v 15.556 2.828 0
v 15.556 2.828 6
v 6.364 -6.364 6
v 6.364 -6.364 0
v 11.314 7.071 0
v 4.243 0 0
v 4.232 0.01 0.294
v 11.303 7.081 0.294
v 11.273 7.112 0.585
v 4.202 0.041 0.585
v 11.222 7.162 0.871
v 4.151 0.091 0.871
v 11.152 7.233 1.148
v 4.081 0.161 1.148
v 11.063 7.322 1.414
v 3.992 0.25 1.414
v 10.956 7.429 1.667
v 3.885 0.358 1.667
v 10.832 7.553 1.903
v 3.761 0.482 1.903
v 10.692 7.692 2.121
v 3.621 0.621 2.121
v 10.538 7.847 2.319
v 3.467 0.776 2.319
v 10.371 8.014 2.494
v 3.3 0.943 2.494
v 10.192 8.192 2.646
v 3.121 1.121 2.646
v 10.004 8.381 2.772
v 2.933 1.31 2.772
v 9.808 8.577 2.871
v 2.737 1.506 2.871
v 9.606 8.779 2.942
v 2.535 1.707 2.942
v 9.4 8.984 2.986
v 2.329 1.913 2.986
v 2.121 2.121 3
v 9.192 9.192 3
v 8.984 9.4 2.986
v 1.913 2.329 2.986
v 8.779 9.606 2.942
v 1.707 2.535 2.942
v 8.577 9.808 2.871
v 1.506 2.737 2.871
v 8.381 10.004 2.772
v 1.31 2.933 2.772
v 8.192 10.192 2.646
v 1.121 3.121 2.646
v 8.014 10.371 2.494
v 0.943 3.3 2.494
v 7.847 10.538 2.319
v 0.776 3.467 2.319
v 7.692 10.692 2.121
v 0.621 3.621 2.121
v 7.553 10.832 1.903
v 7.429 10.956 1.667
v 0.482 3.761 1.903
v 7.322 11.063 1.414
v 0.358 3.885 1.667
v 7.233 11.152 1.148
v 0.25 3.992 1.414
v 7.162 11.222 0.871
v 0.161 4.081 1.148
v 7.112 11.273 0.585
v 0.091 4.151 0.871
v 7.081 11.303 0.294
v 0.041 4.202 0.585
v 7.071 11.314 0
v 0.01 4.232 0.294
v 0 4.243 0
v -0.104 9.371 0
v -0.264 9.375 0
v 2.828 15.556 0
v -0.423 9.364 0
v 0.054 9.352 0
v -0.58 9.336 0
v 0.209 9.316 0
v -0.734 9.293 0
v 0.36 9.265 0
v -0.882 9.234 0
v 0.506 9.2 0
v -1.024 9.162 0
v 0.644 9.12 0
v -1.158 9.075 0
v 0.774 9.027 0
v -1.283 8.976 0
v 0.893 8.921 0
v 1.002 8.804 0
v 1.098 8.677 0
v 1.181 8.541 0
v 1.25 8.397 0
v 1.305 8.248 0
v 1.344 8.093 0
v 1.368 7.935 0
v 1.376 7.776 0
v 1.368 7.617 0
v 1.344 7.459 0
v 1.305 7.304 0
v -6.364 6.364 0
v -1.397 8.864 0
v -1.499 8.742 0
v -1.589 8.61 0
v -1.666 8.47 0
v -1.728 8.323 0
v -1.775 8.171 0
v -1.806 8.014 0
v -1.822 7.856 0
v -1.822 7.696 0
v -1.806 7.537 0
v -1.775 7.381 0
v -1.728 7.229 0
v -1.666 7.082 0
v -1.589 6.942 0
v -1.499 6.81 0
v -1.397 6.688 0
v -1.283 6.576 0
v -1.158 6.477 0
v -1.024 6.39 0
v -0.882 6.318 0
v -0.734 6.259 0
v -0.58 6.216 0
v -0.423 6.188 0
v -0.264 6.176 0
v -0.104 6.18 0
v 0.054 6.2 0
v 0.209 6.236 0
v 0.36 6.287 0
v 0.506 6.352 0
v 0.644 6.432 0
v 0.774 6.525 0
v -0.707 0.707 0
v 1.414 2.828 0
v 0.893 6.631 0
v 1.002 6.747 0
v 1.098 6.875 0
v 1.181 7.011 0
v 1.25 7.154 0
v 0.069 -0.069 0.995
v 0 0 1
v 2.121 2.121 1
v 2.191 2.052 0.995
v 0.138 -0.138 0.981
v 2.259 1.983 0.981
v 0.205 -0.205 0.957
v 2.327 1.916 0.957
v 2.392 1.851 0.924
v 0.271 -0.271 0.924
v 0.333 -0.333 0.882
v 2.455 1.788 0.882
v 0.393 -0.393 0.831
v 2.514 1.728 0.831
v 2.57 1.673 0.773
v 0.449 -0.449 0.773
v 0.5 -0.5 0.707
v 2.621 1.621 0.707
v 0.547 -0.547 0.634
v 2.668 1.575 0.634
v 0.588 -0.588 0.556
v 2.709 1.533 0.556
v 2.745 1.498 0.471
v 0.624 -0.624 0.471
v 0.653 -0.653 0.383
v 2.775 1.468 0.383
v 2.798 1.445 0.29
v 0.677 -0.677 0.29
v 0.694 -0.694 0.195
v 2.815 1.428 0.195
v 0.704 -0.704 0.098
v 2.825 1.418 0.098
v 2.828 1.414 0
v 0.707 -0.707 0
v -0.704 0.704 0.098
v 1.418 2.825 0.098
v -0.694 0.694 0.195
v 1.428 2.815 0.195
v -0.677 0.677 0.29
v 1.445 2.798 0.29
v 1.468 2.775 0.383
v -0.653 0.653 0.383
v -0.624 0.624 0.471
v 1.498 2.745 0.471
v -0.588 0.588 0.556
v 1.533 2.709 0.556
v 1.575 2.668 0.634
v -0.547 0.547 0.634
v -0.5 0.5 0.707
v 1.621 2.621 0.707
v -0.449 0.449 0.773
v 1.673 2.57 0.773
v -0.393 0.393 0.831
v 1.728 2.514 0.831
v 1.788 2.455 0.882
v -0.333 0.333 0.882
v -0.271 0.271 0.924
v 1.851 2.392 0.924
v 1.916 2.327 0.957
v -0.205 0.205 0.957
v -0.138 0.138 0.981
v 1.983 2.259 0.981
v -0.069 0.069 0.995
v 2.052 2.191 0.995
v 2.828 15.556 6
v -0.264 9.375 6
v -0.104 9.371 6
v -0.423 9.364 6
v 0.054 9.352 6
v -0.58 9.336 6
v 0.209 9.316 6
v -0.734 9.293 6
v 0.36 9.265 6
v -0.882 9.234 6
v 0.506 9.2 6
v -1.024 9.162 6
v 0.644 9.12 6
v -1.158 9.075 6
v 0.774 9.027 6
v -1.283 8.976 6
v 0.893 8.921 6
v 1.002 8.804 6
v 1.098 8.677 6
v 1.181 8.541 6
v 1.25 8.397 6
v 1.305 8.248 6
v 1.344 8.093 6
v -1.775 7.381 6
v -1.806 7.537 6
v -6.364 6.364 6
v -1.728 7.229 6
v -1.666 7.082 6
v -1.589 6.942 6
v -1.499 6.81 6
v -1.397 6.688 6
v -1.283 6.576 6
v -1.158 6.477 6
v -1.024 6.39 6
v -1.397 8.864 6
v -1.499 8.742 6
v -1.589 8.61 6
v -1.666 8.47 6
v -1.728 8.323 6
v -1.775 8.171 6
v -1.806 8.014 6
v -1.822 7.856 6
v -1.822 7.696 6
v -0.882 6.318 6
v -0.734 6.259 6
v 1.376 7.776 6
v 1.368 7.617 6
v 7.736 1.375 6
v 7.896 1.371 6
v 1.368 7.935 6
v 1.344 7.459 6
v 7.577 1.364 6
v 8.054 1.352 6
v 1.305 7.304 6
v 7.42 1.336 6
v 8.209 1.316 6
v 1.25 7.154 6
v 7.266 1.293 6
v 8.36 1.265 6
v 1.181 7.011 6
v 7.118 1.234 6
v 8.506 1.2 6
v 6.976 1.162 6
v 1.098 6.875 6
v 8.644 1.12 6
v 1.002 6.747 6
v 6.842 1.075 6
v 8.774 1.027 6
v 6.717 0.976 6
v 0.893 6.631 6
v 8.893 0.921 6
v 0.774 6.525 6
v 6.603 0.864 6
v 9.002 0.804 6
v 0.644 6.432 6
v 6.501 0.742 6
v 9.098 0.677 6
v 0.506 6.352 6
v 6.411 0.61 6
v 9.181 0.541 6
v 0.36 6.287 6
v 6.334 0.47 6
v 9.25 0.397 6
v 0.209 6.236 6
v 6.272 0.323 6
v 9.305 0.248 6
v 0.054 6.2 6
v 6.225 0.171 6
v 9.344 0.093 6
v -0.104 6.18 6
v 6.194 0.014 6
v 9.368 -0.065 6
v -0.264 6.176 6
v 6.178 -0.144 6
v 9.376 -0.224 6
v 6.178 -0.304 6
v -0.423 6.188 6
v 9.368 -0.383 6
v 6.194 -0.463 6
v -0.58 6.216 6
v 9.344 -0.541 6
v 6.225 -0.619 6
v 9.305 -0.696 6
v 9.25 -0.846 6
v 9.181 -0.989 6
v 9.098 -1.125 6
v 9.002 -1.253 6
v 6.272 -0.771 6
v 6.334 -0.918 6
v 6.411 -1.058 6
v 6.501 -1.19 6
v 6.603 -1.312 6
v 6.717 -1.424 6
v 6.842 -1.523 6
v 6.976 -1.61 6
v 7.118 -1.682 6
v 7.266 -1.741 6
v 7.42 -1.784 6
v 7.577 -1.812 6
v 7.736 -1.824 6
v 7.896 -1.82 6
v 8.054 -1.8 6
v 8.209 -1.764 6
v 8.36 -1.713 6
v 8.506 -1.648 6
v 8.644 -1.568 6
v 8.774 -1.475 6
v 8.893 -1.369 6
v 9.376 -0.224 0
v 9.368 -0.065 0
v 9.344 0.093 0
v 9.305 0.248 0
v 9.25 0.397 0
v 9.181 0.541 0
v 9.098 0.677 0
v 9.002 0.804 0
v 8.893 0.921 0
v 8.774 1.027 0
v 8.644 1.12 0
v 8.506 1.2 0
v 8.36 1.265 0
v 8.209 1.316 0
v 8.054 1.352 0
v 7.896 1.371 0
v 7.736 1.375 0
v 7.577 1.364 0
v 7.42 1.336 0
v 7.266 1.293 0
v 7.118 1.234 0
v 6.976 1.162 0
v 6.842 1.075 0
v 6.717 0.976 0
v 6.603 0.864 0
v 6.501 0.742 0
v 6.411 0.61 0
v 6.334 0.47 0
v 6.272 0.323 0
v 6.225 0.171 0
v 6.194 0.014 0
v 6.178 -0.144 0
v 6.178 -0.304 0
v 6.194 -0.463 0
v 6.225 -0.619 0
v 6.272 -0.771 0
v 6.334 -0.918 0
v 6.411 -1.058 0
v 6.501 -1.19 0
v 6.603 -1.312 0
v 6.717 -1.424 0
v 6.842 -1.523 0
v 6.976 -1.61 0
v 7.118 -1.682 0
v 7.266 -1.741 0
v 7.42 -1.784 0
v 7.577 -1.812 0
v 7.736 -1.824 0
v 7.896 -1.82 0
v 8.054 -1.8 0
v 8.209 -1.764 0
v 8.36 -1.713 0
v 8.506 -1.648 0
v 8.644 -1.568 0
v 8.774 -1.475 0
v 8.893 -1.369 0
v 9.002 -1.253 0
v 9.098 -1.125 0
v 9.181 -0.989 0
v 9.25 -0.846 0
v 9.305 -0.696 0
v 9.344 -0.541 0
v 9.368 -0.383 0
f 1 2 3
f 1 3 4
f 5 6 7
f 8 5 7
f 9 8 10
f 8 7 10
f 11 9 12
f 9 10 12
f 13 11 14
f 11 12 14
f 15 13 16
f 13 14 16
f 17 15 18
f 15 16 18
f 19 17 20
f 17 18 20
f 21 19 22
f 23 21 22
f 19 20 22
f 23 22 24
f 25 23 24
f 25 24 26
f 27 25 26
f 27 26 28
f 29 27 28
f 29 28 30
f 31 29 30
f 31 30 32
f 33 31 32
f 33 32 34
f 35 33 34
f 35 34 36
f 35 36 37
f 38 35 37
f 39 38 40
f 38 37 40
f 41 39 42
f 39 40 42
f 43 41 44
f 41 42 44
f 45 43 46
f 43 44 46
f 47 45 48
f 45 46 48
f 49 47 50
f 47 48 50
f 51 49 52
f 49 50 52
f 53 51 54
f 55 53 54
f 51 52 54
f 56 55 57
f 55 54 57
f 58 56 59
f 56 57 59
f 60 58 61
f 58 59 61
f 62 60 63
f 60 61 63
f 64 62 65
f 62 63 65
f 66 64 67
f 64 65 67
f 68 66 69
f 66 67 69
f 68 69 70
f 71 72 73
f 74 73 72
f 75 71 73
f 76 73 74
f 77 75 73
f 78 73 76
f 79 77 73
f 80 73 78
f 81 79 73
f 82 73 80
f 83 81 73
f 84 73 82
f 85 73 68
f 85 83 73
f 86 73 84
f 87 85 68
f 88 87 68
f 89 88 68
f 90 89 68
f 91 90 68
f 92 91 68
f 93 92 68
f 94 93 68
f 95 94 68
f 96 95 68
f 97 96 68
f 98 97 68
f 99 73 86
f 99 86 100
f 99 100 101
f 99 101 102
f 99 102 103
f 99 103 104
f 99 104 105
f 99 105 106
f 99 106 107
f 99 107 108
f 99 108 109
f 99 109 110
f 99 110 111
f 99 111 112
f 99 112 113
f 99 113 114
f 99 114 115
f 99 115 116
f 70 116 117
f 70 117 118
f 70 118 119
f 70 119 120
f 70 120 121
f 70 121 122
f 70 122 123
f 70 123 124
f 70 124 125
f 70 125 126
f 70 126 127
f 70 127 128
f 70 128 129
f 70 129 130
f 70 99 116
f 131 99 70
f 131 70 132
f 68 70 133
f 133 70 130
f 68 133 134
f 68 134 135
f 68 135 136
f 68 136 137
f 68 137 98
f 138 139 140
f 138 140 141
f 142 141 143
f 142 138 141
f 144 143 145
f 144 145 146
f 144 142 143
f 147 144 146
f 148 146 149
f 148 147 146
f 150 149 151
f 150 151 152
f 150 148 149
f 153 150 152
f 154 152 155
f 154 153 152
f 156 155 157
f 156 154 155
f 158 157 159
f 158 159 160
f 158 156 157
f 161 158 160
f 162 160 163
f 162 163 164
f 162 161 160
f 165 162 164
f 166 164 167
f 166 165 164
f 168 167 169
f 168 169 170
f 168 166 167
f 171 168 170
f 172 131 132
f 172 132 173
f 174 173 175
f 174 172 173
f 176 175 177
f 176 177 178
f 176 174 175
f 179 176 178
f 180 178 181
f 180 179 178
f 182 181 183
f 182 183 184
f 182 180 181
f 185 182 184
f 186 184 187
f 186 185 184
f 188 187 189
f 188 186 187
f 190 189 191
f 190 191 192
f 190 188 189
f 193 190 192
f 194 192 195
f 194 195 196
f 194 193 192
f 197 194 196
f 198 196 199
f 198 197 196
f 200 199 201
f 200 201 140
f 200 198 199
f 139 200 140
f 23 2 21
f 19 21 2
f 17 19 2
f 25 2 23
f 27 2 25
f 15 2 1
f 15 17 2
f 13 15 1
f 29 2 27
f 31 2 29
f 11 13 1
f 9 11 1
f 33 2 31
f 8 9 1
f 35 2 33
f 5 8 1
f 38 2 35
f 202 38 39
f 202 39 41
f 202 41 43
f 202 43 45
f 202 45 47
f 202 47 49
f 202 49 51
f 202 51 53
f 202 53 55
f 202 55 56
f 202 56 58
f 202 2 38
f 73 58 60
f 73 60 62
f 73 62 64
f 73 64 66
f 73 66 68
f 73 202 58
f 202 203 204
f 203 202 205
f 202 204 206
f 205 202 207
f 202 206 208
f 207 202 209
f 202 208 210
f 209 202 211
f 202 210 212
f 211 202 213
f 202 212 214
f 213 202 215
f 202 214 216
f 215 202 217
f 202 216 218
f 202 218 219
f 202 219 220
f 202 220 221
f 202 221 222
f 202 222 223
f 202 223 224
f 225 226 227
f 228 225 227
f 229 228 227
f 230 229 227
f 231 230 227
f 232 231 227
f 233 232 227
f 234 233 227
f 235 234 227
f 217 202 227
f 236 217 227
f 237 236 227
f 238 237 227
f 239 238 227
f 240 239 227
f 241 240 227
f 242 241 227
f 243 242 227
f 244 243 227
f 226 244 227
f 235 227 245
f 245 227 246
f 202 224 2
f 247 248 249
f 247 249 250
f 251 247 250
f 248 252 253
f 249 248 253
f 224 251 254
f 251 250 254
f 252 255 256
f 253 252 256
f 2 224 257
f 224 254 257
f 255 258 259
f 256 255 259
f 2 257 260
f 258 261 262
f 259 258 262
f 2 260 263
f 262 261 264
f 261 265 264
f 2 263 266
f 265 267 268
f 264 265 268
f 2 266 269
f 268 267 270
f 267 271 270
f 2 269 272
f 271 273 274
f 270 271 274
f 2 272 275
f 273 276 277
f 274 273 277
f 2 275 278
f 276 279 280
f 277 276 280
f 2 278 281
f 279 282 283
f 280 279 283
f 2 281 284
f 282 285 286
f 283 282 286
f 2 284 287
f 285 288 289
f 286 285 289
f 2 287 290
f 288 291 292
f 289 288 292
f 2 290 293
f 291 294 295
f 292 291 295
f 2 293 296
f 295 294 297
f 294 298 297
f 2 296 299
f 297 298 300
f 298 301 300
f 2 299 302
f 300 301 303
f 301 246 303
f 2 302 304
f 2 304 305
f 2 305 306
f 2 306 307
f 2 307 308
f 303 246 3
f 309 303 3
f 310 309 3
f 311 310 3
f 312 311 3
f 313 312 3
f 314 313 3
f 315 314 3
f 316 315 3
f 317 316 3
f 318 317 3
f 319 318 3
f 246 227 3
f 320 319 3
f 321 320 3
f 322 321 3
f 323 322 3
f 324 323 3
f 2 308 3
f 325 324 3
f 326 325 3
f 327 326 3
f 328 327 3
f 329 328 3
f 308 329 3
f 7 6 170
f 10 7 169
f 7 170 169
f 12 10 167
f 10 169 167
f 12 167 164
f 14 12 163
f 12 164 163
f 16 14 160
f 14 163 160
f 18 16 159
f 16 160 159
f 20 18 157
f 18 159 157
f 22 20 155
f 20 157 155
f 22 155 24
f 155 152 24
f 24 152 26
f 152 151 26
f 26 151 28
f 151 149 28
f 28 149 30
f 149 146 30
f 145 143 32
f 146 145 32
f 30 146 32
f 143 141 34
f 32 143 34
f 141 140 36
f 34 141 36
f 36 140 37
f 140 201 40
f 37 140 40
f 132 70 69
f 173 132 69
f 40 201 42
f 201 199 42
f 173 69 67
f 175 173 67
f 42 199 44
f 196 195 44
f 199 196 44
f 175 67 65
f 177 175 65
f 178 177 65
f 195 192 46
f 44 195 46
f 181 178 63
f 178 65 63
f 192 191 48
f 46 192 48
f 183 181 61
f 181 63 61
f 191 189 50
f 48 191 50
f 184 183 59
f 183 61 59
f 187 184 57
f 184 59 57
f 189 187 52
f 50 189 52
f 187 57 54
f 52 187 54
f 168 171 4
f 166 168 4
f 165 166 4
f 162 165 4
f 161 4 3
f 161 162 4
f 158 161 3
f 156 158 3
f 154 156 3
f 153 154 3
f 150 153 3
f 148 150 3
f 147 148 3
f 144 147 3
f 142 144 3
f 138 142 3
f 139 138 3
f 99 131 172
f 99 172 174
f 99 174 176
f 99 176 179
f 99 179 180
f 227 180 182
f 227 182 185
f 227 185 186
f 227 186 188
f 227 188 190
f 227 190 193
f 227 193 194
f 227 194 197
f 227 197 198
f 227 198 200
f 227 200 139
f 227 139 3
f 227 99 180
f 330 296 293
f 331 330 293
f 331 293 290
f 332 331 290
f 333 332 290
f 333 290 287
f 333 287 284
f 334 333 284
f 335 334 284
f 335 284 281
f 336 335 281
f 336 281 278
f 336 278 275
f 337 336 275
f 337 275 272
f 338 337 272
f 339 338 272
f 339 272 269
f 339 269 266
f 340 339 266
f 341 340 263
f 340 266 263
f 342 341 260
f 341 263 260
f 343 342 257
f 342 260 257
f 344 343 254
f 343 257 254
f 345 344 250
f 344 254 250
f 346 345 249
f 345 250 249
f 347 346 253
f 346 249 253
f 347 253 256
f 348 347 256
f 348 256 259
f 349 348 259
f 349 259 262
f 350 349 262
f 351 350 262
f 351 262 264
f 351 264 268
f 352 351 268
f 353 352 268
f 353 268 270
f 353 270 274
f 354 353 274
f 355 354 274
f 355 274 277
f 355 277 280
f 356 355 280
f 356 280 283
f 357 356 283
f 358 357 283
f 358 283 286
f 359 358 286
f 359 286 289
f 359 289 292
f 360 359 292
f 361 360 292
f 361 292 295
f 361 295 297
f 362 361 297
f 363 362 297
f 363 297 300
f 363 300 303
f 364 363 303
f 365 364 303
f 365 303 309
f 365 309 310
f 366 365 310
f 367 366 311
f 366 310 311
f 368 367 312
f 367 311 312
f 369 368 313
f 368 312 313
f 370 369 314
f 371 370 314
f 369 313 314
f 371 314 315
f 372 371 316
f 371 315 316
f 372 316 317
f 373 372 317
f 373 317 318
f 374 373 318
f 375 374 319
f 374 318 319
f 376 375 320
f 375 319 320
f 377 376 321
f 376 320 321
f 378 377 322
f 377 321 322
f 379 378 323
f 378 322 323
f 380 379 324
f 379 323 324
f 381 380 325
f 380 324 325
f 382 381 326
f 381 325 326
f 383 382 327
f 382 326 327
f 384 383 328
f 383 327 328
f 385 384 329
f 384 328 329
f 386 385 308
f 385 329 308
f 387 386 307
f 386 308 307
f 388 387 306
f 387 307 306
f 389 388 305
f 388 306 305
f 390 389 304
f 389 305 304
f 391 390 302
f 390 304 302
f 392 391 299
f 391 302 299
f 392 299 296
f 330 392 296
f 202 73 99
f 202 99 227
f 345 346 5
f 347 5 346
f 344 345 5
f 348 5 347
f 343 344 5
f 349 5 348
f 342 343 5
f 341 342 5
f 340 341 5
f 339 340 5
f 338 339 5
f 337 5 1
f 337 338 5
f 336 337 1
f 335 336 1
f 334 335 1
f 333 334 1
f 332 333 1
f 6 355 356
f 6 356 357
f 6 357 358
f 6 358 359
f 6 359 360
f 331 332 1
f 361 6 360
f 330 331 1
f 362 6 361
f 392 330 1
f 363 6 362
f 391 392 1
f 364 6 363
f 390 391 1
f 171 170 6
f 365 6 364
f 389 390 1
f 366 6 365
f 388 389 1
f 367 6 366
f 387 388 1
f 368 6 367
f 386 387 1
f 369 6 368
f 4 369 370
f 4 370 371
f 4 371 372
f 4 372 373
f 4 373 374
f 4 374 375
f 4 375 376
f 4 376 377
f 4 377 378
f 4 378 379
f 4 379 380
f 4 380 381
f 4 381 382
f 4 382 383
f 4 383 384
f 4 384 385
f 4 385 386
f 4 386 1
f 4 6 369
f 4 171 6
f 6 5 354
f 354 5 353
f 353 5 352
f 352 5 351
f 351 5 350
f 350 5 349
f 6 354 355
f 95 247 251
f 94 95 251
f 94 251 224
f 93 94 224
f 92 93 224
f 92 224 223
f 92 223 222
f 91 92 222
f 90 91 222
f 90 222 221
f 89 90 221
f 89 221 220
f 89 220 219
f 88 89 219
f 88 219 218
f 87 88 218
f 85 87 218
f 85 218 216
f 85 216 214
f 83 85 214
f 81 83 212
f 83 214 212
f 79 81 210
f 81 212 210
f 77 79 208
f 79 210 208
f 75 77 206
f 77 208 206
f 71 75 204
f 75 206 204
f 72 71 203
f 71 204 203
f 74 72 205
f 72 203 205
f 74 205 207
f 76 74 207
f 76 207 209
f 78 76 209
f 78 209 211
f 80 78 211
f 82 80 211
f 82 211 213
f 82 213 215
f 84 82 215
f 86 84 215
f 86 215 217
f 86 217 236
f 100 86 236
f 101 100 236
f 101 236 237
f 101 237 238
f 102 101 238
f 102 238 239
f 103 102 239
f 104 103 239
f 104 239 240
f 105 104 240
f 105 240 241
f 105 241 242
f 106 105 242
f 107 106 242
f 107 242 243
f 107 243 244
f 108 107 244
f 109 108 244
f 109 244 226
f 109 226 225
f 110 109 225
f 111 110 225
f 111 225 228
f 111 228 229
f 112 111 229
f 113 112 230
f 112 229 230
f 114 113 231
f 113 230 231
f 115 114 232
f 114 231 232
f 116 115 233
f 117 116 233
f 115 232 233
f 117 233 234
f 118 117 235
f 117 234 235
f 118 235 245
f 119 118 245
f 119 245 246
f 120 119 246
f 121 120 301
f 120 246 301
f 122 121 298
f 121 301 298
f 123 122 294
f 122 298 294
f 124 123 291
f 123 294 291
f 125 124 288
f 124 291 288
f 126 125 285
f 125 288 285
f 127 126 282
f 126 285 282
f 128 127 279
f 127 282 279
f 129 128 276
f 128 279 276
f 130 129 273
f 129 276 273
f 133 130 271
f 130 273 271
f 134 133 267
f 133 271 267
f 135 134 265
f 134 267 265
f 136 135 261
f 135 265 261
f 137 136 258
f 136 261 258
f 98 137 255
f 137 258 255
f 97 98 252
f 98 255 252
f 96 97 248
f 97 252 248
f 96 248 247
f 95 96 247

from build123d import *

# Parameters (mm, degrees)
EXTRUDE_1_DEPTH     = 13
EXTRUDE_2_DEPTH     = 3
SKETCH_4_R          = 1.6
CUT_EXTRUDE_1_DEPTH = 10


with BuildPart() as part:
    # 草图3 → 凸台-拉伸1 (new body)
    with BuildSketch(Plane(origin=(0, 0, 0), x_dir=(0, 0, -1), z_dir=(0.7071067811865488, 0.7071067811865464, 0))):
        with BuildLine():
            Line((0, 3), (0, 9))
            Line((0, 9), (-6, 9))
            Line((-6, 9), (-6, -9))
            Line((-6, -9), (0, -9))
            Line((0, -9), (0, -3))
            ThreePointArc((0, -3), (-3, 0), (0, 3))
        make_face()
    extrude(amount=EXTRUDE_1_DEPTH)

    # 草图5 → 凸台-拉伸2 (add)
    with BuildSketch(Plane(origin=(0, 0, 0), x_dir=(0, 0, 1), z_dir=(-0.7071067811865488, -0.7071067811865462, 0))):
        with BuildLine():
            Line((0, -1), (0, -3))
            ThreePointArc((0, -3), (2.121320344, -2.121320344), (3, 0))
            ThreePointArc((3, 0), (2.121320344, 2.121320344), (0, 3))
            Line((0, 3), (0, 1))
            ThreePointArc((0, 1), (0.707106781, 0.707106781), (1, 0))
            ThreePointArc((1, 0), (0.707106781, -0.707106781), (0, -1))
        make_face()
    extrude(amount=-EXTRUDE_2_DEPTH)

    # 草图4 → 切除-拉伸1 (cut)
    with BuildSketch(Plane.XY.offset(6)):
        with Locations((-0.224049788, 7.775950212)):
            Circle(SKETCH_4_R)
        with Locations((7.775950212, -0.224049788)):
            Circle(SKETCH_4_R)
    extrude(amount=-CUT_EXTRUDE_1_DEPTH, mode=Mode.SUBTRACT)


solid = part.part
